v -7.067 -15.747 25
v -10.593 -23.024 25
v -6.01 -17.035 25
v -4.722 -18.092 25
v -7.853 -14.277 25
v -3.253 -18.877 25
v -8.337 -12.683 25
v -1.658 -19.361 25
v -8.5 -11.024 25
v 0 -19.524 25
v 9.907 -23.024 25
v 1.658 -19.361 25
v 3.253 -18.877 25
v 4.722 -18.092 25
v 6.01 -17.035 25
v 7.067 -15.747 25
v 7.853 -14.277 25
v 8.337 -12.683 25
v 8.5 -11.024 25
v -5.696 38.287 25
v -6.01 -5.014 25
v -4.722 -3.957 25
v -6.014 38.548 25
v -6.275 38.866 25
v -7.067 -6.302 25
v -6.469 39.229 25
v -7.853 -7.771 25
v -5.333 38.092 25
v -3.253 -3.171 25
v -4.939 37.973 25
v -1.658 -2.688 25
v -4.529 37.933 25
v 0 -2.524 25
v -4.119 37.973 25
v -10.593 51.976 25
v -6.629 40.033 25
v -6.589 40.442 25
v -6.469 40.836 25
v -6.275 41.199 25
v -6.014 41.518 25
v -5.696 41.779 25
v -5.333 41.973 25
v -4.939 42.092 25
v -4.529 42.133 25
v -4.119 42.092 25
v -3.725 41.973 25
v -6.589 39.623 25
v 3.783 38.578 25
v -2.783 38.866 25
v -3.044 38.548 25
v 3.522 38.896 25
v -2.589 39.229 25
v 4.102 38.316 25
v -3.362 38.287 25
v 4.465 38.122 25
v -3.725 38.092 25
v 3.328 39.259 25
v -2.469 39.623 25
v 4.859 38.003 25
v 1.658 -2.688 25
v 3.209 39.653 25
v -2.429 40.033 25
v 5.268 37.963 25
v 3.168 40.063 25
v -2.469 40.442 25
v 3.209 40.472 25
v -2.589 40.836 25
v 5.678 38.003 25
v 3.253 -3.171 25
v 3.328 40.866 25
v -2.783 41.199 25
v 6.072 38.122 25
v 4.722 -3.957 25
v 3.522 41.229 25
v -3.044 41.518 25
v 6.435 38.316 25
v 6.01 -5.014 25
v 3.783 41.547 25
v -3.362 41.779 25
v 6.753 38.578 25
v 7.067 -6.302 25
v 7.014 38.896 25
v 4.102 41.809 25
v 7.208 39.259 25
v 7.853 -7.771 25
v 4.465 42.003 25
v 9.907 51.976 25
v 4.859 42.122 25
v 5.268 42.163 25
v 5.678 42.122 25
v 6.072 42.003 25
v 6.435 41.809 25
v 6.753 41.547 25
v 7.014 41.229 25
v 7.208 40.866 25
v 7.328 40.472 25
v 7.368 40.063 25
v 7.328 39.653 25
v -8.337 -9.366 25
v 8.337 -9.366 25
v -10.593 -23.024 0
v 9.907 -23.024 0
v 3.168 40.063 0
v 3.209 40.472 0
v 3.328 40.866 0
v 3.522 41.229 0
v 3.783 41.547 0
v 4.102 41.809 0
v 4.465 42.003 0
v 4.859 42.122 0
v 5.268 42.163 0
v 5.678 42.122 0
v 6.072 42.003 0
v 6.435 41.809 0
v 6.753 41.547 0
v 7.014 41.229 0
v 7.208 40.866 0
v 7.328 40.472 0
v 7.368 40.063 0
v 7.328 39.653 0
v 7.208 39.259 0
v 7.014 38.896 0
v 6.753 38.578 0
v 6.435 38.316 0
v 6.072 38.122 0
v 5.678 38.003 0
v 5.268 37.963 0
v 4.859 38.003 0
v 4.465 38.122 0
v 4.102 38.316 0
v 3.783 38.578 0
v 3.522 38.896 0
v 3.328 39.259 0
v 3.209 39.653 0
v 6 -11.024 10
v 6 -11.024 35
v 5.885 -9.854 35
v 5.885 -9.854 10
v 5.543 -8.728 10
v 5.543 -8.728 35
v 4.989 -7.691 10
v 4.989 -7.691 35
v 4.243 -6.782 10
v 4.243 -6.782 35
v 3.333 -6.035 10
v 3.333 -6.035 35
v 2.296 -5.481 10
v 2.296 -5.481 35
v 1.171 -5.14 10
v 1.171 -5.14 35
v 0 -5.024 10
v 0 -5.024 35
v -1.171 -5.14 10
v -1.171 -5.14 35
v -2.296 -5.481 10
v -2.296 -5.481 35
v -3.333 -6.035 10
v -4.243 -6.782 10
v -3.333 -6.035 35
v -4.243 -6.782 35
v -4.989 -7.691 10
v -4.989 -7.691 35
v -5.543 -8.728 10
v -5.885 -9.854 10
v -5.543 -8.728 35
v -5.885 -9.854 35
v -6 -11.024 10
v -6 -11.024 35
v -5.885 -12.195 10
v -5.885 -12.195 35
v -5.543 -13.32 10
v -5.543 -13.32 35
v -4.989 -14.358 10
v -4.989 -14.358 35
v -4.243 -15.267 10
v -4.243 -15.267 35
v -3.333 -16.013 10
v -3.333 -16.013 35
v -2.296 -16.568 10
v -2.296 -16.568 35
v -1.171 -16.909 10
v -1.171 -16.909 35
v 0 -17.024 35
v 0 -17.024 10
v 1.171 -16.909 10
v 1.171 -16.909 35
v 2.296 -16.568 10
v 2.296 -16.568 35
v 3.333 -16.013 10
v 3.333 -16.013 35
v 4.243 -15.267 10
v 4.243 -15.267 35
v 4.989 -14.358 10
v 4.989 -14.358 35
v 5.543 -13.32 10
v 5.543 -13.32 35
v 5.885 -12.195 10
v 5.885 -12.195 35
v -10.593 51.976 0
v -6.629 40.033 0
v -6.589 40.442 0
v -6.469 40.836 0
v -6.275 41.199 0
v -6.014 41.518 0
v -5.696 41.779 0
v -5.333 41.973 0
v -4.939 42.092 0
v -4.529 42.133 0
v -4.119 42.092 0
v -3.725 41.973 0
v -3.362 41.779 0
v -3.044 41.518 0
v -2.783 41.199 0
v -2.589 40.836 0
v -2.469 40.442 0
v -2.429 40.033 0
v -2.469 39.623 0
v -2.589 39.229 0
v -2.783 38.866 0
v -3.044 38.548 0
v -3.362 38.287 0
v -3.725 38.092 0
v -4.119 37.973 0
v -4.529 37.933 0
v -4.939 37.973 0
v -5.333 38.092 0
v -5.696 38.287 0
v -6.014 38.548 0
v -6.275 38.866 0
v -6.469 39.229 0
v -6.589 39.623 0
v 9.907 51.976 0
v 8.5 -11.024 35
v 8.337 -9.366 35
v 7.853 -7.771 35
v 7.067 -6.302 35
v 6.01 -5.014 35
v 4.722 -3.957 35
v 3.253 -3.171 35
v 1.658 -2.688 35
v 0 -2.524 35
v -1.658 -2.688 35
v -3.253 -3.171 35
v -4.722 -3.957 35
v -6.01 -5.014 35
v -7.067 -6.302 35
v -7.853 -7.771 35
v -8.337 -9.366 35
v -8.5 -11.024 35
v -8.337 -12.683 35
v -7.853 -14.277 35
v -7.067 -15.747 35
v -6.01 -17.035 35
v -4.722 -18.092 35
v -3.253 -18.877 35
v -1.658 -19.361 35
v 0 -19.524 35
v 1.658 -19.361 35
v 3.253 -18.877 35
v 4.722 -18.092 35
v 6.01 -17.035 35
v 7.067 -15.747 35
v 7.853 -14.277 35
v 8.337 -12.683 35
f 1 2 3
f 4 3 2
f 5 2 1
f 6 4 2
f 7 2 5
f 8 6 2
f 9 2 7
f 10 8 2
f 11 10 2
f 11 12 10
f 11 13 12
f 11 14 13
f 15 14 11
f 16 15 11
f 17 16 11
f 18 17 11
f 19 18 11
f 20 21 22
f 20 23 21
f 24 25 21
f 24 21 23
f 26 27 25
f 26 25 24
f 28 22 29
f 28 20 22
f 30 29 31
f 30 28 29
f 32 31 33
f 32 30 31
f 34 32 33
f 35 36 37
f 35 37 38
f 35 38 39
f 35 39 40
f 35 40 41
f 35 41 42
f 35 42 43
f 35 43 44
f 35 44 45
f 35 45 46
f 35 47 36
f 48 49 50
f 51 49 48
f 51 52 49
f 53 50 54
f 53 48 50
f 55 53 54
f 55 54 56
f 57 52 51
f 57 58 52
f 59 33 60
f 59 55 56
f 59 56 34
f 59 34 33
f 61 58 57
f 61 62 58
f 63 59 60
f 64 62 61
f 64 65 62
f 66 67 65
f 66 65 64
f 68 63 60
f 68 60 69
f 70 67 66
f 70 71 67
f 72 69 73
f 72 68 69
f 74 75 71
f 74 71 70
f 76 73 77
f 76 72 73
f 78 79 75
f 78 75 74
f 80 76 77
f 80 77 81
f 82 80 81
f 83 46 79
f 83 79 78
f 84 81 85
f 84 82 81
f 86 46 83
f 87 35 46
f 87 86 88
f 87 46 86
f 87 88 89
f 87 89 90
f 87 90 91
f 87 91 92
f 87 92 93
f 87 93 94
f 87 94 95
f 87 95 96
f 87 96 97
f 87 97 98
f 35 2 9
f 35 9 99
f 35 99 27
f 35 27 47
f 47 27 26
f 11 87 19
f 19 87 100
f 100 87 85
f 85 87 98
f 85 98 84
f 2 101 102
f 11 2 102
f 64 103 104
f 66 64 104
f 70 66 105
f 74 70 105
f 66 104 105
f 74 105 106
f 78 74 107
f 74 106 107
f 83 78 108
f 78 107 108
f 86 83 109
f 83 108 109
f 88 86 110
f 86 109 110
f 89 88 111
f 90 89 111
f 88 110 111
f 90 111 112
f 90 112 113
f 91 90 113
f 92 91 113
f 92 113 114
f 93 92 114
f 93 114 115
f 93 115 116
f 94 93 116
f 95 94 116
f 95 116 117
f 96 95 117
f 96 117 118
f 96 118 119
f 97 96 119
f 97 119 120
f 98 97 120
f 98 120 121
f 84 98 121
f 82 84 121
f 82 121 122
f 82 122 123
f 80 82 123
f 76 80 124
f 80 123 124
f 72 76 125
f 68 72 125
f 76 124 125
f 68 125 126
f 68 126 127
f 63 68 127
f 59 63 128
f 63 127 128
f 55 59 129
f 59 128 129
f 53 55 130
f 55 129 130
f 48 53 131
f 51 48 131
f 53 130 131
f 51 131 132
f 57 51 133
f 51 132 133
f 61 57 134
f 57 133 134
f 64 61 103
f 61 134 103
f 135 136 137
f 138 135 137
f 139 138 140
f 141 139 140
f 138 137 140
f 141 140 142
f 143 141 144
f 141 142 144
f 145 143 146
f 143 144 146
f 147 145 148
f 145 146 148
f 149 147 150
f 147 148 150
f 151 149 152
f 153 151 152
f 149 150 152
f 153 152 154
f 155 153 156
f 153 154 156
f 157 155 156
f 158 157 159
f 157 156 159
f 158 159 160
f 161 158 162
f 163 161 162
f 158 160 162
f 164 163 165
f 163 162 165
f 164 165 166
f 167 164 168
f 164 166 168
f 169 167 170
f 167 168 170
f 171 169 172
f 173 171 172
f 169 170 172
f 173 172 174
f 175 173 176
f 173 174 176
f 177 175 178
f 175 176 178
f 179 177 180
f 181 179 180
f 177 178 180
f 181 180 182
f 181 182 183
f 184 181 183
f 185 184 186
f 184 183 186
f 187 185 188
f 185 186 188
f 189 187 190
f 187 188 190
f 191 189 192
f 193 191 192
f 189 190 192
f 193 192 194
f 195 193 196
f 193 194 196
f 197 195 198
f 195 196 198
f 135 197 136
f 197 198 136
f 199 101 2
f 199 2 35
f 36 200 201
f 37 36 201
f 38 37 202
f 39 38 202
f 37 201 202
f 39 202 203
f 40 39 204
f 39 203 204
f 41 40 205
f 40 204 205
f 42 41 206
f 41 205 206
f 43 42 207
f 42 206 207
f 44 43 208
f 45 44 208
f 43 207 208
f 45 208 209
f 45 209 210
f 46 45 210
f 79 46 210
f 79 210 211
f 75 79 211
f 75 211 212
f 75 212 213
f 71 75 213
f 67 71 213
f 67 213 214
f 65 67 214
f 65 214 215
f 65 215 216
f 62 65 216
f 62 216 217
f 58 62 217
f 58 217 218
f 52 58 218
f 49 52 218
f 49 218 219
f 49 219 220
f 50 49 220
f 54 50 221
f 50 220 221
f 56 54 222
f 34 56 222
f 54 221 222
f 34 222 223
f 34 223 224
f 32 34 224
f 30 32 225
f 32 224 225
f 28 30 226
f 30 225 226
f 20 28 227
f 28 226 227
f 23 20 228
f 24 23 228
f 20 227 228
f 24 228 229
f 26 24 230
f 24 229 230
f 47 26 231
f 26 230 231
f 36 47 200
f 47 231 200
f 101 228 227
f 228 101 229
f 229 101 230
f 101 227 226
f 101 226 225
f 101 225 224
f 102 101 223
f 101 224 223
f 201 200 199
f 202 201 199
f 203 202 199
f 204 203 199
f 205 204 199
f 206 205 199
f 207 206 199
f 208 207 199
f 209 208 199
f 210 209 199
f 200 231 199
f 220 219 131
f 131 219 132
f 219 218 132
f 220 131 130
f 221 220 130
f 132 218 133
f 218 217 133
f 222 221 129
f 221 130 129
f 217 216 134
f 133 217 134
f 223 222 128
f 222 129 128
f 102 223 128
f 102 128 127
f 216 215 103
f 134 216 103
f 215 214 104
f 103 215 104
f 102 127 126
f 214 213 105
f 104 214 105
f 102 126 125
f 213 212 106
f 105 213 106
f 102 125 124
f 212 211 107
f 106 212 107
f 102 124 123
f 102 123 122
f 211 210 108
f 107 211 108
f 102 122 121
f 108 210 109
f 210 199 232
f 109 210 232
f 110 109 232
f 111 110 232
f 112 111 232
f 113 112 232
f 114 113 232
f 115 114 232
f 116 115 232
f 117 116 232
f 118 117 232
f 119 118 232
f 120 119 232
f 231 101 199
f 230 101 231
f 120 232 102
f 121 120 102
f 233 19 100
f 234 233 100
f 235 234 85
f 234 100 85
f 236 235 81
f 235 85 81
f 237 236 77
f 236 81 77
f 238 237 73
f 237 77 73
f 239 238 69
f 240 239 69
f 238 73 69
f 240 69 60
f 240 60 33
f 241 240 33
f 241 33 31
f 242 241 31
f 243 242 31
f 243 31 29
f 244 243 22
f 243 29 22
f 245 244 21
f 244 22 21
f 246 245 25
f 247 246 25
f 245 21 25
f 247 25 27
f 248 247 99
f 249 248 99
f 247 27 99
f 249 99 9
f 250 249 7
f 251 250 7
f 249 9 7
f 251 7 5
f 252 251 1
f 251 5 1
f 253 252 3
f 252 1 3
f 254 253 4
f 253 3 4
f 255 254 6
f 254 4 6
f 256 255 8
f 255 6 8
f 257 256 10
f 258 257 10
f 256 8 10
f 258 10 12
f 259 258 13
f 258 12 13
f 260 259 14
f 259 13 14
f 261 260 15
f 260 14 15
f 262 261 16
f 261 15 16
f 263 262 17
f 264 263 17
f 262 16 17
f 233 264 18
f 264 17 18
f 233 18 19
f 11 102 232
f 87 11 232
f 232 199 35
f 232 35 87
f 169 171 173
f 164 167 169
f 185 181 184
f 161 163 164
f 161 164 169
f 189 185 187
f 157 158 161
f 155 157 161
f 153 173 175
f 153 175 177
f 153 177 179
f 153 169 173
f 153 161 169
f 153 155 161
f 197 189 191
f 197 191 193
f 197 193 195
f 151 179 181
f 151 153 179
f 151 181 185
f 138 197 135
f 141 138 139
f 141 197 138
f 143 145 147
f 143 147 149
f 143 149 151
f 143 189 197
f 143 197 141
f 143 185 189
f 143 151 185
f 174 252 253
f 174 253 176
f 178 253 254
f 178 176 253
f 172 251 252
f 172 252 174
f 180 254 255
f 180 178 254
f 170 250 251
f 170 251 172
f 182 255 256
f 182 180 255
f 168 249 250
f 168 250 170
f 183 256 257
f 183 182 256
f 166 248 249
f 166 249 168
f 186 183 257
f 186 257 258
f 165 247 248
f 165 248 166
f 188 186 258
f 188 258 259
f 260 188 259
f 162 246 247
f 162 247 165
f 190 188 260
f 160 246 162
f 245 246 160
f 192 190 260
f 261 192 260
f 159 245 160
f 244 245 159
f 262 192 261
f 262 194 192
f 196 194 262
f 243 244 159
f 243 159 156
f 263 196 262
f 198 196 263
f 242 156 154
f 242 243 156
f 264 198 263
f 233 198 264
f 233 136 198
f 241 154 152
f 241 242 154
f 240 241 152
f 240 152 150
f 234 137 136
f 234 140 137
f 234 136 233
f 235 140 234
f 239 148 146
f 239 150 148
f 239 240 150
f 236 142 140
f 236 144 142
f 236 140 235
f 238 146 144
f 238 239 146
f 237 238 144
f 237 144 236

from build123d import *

# Parameters (mm, degrees)
F0_W     = 20.5
F0_H     = 75
F1_DEPTH = 25
F2_R     = 8.5
F3_DEPTH = 10
F5_D     = 4.2
F6_R     = 6
F7_DEPTH = 25


with BuildPart() as f1:
    # F0 (on Top) → F1 (new body)
    with BuildSketch(Plane.XY):
        with Locations((-0.3433860838, 14.475764136)):
            Rectangle(F0_W, F0_H)
    extrude(amount=F1_DEPTH)

    # F2 (on face) → F3 (join)
    with BuildSketch(Plane.XY.offset(25)):
        with Locations((0, -11.024235864)):
            Circle(F2_R)
    extrude(amount=F3_DEPTH)

    # F5 (through all)
    with Locations(Plane.XY.offset(25)):
        with Locations((-4.5289483146, 40.0326289237), (5.268279344, 40.0625547821)):
            Hole(F5_D / 2)

    # F6 (on face) → F7 (cut)
    with BuildSketch(Plane.XY.offset(35)):
        with Locations((0, -11.024235864)):
            Circle(F6_R)
    extrude(amount=-F7_DEPTH, mode=Mode.SUBTRACT)


solid = f1.part
